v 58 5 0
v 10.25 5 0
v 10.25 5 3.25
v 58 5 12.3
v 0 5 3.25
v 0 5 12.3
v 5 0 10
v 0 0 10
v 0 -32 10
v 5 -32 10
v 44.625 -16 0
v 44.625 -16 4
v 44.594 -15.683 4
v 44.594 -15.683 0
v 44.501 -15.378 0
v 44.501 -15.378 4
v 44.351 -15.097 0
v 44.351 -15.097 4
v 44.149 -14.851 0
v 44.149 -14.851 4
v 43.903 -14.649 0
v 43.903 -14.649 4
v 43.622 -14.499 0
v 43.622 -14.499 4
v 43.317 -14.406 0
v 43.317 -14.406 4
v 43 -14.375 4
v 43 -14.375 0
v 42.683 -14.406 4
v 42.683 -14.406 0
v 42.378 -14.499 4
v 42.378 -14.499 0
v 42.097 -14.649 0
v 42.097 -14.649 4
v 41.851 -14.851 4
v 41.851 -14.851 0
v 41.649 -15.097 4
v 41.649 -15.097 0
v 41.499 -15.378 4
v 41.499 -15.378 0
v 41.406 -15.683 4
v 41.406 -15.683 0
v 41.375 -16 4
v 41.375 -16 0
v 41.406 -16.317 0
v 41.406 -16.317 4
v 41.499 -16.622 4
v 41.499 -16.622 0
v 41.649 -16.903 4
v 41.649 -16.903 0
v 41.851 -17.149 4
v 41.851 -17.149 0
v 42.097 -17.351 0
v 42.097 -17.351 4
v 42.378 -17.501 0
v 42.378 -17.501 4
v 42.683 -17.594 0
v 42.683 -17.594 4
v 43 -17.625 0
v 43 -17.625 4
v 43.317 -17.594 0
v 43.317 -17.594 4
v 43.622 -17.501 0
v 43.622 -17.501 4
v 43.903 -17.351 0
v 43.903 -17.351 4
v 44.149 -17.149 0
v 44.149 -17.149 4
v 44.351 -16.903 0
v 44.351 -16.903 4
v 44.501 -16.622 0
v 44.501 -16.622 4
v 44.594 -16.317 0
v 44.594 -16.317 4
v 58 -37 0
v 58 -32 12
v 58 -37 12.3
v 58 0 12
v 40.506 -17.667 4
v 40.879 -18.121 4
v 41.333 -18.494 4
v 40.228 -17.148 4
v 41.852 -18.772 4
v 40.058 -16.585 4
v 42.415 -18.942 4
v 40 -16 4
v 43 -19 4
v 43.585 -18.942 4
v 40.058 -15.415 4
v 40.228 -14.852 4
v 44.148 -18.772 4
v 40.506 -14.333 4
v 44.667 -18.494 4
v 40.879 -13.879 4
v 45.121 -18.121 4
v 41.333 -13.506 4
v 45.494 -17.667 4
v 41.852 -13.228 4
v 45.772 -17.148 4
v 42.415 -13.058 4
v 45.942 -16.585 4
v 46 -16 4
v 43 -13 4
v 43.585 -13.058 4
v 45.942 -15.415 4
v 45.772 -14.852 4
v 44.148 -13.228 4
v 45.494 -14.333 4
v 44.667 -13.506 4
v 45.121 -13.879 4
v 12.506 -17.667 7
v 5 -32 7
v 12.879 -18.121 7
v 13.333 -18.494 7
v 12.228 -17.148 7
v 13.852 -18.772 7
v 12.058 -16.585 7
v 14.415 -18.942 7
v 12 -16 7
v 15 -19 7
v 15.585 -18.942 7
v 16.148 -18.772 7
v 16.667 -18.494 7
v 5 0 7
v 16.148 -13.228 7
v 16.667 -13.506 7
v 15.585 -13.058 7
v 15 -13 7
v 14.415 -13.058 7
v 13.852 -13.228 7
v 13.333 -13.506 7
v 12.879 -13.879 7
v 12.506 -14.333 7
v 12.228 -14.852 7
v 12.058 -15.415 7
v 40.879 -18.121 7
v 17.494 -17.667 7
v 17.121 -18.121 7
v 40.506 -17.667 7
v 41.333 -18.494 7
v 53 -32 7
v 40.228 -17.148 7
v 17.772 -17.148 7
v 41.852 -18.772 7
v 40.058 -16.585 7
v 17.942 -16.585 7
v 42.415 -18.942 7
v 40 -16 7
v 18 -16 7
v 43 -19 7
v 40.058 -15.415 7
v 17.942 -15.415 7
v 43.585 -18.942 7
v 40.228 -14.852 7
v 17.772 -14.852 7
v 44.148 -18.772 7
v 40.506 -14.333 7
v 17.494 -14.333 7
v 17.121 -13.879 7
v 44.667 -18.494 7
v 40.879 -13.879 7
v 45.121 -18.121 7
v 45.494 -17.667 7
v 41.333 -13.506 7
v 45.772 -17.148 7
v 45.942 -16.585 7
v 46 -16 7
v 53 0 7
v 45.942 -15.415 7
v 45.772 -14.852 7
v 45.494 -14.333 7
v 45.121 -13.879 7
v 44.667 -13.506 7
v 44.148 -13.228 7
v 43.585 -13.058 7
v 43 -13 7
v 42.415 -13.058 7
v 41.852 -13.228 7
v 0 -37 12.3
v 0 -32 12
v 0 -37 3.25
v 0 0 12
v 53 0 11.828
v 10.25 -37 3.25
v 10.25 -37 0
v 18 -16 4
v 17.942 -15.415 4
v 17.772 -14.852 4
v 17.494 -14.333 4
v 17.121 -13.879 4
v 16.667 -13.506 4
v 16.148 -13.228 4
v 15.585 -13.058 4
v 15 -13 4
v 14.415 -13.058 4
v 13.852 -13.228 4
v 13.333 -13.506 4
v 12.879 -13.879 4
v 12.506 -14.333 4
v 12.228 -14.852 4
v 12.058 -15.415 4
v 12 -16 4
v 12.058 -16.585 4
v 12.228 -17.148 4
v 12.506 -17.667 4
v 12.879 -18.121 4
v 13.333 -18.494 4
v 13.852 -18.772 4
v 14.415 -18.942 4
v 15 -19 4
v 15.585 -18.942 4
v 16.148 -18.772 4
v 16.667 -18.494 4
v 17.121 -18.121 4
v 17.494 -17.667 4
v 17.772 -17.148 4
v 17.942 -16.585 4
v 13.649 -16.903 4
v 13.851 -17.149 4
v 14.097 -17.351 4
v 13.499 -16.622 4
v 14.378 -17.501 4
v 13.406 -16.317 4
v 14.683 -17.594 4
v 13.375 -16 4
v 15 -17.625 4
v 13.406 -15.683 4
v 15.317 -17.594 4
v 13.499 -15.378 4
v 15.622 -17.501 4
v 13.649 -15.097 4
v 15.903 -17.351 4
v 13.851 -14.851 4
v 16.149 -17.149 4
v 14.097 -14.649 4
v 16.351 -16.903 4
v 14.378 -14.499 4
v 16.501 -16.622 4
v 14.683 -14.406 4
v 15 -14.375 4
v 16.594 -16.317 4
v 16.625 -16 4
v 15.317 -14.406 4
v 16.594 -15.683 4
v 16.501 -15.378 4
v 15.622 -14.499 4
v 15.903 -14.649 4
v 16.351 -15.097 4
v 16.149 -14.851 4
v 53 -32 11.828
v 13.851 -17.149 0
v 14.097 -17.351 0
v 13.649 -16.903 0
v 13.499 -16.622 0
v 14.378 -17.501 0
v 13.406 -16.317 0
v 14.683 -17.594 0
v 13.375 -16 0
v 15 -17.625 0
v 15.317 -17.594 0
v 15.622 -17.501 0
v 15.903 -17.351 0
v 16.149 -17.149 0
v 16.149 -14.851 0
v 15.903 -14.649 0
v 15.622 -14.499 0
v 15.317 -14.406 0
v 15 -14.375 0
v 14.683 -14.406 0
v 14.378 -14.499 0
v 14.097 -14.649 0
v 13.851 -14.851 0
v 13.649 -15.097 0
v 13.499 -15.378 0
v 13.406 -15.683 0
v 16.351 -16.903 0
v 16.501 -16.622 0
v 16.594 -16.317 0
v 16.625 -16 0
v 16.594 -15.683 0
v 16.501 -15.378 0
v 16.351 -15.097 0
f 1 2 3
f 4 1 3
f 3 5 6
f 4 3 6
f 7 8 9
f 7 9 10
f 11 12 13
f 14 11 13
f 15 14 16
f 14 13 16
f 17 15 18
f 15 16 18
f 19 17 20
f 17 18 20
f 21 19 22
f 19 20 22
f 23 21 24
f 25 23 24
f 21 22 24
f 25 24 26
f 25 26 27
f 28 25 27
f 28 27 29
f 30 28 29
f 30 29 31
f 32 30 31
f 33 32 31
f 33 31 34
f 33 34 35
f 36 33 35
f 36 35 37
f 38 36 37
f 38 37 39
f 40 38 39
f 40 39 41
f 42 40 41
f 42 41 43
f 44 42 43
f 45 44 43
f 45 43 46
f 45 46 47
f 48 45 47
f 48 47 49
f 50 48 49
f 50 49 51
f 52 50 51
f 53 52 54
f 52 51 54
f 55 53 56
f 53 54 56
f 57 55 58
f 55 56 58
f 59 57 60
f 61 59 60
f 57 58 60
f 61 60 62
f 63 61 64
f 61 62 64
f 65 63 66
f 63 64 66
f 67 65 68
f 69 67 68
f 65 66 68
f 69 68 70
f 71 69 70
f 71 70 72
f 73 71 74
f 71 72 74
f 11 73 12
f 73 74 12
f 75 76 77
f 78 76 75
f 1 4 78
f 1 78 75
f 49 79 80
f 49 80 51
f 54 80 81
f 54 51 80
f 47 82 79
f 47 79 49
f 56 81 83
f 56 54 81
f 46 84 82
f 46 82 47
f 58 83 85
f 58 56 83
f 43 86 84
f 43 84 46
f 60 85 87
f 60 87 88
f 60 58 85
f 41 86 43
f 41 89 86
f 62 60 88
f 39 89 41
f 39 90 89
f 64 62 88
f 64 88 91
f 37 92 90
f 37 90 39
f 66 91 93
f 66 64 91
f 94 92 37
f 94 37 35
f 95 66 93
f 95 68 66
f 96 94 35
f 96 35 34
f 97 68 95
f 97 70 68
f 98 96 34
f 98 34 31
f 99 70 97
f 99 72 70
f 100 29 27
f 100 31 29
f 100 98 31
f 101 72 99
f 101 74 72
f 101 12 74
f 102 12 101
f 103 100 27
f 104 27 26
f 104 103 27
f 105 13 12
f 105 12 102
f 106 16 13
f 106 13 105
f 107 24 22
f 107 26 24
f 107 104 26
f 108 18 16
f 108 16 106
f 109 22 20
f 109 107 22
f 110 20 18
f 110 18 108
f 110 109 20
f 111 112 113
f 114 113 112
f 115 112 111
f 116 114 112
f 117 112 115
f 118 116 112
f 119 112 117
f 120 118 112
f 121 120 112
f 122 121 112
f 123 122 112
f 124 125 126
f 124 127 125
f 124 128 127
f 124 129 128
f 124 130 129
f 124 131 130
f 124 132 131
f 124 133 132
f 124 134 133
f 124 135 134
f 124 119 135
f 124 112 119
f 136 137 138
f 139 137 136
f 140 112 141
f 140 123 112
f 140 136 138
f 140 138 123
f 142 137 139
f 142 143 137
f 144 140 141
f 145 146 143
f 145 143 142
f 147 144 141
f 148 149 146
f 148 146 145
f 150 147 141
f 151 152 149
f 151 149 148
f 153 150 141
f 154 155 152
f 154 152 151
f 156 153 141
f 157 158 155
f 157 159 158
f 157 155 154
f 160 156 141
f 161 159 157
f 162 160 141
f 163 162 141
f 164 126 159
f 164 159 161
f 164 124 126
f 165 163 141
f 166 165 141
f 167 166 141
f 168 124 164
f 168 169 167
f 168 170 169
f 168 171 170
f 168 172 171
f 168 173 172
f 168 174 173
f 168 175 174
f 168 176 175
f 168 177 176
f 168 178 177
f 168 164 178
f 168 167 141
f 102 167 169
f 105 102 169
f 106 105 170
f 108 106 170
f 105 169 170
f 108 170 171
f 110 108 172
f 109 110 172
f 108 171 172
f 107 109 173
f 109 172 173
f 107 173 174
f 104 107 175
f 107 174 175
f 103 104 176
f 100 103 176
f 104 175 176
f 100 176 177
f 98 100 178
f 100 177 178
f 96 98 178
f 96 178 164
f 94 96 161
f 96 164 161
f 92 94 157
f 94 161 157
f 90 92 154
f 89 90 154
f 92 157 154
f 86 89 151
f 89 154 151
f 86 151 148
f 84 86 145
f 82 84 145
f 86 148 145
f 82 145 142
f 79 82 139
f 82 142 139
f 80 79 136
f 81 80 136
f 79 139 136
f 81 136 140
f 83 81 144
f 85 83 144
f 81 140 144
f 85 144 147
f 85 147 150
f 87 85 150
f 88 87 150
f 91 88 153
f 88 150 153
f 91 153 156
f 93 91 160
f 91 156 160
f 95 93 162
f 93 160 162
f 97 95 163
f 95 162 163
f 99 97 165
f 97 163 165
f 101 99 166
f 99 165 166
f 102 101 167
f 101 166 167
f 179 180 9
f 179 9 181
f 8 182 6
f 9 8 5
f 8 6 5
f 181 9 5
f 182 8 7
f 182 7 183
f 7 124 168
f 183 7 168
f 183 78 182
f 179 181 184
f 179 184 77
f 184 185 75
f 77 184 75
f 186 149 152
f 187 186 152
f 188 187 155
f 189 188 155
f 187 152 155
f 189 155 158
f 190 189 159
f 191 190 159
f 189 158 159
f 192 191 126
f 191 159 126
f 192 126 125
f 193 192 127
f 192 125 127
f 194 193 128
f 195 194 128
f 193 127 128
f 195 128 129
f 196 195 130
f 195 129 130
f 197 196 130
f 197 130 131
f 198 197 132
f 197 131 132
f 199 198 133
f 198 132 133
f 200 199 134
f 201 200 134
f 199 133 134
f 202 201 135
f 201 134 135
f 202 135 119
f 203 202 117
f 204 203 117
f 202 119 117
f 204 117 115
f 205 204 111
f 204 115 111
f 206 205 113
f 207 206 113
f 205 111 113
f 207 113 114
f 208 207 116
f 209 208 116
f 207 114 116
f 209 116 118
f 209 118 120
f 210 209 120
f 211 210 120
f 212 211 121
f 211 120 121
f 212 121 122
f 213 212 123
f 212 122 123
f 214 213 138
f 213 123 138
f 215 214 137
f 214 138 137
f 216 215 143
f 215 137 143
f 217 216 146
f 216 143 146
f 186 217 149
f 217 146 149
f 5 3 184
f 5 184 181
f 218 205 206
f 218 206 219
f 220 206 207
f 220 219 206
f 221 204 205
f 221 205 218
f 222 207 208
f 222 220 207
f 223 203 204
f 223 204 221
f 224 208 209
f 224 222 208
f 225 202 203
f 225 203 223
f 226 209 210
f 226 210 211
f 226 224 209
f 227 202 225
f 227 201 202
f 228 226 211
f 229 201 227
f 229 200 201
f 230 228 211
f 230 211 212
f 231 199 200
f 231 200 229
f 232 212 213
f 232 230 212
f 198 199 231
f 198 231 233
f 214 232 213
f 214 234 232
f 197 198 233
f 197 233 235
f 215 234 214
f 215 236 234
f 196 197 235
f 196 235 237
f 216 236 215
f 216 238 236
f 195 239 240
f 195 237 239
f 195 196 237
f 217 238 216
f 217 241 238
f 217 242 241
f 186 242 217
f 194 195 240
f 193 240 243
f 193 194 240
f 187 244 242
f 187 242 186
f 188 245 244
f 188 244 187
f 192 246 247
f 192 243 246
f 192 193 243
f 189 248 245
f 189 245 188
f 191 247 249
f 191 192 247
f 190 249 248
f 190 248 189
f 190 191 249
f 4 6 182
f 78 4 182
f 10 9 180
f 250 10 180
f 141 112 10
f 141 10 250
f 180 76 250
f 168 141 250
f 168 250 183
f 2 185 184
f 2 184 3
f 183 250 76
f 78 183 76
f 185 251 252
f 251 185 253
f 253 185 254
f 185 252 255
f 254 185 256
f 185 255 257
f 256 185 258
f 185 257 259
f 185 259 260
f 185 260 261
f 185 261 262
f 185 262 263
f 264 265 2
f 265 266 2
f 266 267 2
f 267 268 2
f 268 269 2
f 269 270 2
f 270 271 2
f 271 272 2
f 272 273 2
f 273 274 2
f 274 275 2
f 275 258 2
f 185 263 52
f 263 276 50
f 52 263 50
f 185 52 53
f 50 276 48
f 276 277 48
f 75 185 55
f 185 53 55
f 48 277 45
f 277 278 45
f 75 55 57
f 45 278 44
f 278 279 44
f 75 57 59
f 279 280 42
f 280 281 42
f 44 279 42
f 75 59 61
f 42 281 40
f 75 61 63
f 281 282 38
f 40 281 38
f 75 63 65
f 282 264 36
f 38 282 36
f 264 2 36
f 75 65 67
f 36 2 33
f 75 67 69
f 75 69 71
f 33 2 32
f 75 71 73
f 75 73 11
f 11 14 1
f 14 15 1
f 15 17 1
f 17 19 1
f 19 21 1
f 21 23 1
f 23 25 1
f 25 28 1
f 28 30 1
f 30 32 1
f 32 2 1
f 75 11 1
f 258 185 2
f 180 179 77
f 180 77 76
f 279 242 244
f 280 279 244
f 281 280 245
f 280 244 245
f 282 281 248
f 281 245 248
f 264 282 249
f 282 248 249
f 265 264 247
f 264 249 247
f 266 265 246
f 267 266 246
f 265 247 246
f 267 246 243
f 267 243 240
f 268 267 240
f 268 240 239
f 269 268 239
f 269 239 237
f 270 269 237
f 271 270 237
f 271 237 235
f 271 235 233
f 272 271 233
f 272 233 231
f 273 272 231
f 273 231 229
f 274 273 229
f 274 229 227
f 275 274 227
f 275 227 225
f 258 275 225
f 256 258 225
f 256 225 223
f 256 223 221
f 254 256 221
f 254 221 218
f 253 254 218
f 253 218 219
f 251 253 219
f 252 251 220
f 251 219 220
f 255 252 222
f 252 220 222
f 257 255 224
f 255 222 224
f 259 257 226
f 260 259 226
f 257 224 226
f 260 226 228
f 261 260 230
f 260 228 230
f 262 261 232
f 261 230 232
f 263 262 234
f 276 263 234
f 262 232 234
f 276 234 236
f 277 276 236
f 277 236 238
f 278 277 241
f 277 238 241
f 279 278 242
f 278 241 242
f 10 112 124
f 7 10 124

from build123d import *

# Parameters (mm, degrees)
ESQUISSE1_W                  = 58
ESQUISSE1_H                  = 32
BOSS_EXTRU_1_DEPTH           = 7
ESQUISSE2_W                  = 5
ESQUISSE2_H                  = 32
BOSS_EXTRU_3_DEPTH           = 3
ESQUISSE3_W                  = 5
ESQUISSE3_H                  = 32
BOSS_EXTRU_4_DEPTH           = 5
ENL_V_MAT_EXTRU_1_DEPTH      = 33
ESQUISSE6_R                  = 1.625
ENL_V_MAT_EXTRU_2_DEPTH      = 8
ESQUISSE8_R                  = 3
ENL_V_MAT_EXTRU_4_DEPTH      = 3
ESQUISSE7_W                  = 10.25
ESQUISSE7_H                  = 3.25
ENL_V_MAT_EXTRU_3_DEPTH      = 10
ENL_V_MAT_EXTRU_3_DEPTH_BACK = 50
ESQUISSE9_W                  = 58
ESQUISSE9_H                  = 5
BOSS_EXTRU_5_DEPTH           = 12
BOSS_EXTRU_6_DEPTH           = 58
ESQUISSE12_W                 = 10.25
ESQUISSE12_H                 = 5
ENL_V_MAT_EXTRU_5_DEPTH      = 3.25


with BuildPart() as part:
    # Esquisse1 → Boss.-Extru.1 (new body)
    with BuildSketch(Plane.XY):
        with Locations((29, -16)):
            Rectangle(ESQUISSE1_W, ESQUISSE1_H)
    extrude(amount=BOSS_EXTRU_1_DEPTH)

    # Esquisse2 → Boss.-Extru.3 (add)
    with BuildSketch(Plane.XY.offset(7)):
        with Locations((2.5, -16)):
            Rectangle(ESQUISSE2_W, ESQUISSE2_H)
    extrude(amount=BOSS_EXTRU_3_DEPTH)

    # Esquisse3 → Boss.-Extru.4 (add)
    with BuildSketch(Plane.XY.offset(7)):
        with Locations((55.5, -16)):
            Rectangle(ESQUISSE3_W, ESQUISSE3_H)
    extrude(amount=BOSS_EXTRU_4_DEPTH)

    # Esquisse4 → Enlèv. mat.-Extru.1 (cut, through all)
    with BuildSketch(Plane.XZ.offset(32)):
        Polygon((0, 10), (58, 12), (0, 12), align=None)
    extrude(amount=-ENL_V_MAT_EXTRU_1_DEPTH, mode=Mode.SUBTRACT)

    # Esquisse6 → Enlèv. mat.-Extru.2 (cut, through all)
    with BuildSketch(Plane.XY.offset(7)):
        with Locations((43, -16)):
            Circle(ESQUISSE6_R)
        with Locations((15, -16)):
            Circle(ESQUISSE6_R)
    extrude(amount=-ENL_V_MAT_EXTRU_2_DEPTH, mode=Mode.SUBTRACT)

    # Esquisse8 → Enlèv. mat.-Extru.4 (cut)
    with BuildSketch(Plane.XY.offset(7)):
        with Locations((15, -16)):
            Circle(ESQUISSE8_R)
        with Locations((43, -16)):
            Circle(ESQUISSE8_R)
    extrude(amount=-ENL_V_MAT_EXTRU_4_DEPTH, mode=Mode.SUBTRACT)

    # Esquisse7 → Enlèv. mat.-Extru.3 (cut, two sides)
    with BuildSketch(Plane.XZ.offset(32)) as enl_v_mat_extru_3_sk:
        with Locations((5.125, 1.625)):
            Rectangle(ESQUISSE7_W, ESQUISSE7_H)
    extrude(amount=ENL_V_MAT_EXTRU_3_DEPTH, mode=Mode.SUBTRACT)
    extrude(enl_v_mat_extru_3_sk.sketch, amount=-ENL_V_MAT_EXTRU_3_DEPTH_BACK, mode=Mode.SUBTRACT)

    # Esquisse9 → Boss.-Extru.5 (add)
    with BuildSketch(Plane.XY):
        with Locations((29, 2.5)):
            Rectangle(ESQUISSE9_W, ESQUISSE9_H)
        with Locations((29, -34.5)):
            Rectangle(ESQUISSE9_W, ESQUISSE9_H)
    extrude(amount=BOSS_EXTRU_5_DEPTH)

    # Esquisse10 → Boss.-Extru.6 (add, through all)
    with BuildSketch(Plane.ZY):
        Polygon((12, 5), (12.3, 5), (12, 0), align=None)
        Polygon((12, -32), (12, -37), (12.3, -37), align=None)
    extrude(amount=-BOSS_EXTRU_6_DEPTH)

    # Esquisse12 → Enlèv. mat.-Extru.5 (cut)
    with BuildSketch(Plane(origin=(0, 0, 0), x_dir=(-1, 0, 0), z_dir=(0, 0, -1))):
        with Locations((-5.125, -34.5)):
            Rectangle(ESQUISSE12_W, ESQUISSE12_H)
        with Locations((-5.125, 2.5)):
            Rectangle(ESQUISSE12_W, ESQUISSE12_H)
    extrude(amount=-ENL_V_MAT_EXTRU_5_DEPTH, mode=Mode.SUBTRACT)


solid = part.part
